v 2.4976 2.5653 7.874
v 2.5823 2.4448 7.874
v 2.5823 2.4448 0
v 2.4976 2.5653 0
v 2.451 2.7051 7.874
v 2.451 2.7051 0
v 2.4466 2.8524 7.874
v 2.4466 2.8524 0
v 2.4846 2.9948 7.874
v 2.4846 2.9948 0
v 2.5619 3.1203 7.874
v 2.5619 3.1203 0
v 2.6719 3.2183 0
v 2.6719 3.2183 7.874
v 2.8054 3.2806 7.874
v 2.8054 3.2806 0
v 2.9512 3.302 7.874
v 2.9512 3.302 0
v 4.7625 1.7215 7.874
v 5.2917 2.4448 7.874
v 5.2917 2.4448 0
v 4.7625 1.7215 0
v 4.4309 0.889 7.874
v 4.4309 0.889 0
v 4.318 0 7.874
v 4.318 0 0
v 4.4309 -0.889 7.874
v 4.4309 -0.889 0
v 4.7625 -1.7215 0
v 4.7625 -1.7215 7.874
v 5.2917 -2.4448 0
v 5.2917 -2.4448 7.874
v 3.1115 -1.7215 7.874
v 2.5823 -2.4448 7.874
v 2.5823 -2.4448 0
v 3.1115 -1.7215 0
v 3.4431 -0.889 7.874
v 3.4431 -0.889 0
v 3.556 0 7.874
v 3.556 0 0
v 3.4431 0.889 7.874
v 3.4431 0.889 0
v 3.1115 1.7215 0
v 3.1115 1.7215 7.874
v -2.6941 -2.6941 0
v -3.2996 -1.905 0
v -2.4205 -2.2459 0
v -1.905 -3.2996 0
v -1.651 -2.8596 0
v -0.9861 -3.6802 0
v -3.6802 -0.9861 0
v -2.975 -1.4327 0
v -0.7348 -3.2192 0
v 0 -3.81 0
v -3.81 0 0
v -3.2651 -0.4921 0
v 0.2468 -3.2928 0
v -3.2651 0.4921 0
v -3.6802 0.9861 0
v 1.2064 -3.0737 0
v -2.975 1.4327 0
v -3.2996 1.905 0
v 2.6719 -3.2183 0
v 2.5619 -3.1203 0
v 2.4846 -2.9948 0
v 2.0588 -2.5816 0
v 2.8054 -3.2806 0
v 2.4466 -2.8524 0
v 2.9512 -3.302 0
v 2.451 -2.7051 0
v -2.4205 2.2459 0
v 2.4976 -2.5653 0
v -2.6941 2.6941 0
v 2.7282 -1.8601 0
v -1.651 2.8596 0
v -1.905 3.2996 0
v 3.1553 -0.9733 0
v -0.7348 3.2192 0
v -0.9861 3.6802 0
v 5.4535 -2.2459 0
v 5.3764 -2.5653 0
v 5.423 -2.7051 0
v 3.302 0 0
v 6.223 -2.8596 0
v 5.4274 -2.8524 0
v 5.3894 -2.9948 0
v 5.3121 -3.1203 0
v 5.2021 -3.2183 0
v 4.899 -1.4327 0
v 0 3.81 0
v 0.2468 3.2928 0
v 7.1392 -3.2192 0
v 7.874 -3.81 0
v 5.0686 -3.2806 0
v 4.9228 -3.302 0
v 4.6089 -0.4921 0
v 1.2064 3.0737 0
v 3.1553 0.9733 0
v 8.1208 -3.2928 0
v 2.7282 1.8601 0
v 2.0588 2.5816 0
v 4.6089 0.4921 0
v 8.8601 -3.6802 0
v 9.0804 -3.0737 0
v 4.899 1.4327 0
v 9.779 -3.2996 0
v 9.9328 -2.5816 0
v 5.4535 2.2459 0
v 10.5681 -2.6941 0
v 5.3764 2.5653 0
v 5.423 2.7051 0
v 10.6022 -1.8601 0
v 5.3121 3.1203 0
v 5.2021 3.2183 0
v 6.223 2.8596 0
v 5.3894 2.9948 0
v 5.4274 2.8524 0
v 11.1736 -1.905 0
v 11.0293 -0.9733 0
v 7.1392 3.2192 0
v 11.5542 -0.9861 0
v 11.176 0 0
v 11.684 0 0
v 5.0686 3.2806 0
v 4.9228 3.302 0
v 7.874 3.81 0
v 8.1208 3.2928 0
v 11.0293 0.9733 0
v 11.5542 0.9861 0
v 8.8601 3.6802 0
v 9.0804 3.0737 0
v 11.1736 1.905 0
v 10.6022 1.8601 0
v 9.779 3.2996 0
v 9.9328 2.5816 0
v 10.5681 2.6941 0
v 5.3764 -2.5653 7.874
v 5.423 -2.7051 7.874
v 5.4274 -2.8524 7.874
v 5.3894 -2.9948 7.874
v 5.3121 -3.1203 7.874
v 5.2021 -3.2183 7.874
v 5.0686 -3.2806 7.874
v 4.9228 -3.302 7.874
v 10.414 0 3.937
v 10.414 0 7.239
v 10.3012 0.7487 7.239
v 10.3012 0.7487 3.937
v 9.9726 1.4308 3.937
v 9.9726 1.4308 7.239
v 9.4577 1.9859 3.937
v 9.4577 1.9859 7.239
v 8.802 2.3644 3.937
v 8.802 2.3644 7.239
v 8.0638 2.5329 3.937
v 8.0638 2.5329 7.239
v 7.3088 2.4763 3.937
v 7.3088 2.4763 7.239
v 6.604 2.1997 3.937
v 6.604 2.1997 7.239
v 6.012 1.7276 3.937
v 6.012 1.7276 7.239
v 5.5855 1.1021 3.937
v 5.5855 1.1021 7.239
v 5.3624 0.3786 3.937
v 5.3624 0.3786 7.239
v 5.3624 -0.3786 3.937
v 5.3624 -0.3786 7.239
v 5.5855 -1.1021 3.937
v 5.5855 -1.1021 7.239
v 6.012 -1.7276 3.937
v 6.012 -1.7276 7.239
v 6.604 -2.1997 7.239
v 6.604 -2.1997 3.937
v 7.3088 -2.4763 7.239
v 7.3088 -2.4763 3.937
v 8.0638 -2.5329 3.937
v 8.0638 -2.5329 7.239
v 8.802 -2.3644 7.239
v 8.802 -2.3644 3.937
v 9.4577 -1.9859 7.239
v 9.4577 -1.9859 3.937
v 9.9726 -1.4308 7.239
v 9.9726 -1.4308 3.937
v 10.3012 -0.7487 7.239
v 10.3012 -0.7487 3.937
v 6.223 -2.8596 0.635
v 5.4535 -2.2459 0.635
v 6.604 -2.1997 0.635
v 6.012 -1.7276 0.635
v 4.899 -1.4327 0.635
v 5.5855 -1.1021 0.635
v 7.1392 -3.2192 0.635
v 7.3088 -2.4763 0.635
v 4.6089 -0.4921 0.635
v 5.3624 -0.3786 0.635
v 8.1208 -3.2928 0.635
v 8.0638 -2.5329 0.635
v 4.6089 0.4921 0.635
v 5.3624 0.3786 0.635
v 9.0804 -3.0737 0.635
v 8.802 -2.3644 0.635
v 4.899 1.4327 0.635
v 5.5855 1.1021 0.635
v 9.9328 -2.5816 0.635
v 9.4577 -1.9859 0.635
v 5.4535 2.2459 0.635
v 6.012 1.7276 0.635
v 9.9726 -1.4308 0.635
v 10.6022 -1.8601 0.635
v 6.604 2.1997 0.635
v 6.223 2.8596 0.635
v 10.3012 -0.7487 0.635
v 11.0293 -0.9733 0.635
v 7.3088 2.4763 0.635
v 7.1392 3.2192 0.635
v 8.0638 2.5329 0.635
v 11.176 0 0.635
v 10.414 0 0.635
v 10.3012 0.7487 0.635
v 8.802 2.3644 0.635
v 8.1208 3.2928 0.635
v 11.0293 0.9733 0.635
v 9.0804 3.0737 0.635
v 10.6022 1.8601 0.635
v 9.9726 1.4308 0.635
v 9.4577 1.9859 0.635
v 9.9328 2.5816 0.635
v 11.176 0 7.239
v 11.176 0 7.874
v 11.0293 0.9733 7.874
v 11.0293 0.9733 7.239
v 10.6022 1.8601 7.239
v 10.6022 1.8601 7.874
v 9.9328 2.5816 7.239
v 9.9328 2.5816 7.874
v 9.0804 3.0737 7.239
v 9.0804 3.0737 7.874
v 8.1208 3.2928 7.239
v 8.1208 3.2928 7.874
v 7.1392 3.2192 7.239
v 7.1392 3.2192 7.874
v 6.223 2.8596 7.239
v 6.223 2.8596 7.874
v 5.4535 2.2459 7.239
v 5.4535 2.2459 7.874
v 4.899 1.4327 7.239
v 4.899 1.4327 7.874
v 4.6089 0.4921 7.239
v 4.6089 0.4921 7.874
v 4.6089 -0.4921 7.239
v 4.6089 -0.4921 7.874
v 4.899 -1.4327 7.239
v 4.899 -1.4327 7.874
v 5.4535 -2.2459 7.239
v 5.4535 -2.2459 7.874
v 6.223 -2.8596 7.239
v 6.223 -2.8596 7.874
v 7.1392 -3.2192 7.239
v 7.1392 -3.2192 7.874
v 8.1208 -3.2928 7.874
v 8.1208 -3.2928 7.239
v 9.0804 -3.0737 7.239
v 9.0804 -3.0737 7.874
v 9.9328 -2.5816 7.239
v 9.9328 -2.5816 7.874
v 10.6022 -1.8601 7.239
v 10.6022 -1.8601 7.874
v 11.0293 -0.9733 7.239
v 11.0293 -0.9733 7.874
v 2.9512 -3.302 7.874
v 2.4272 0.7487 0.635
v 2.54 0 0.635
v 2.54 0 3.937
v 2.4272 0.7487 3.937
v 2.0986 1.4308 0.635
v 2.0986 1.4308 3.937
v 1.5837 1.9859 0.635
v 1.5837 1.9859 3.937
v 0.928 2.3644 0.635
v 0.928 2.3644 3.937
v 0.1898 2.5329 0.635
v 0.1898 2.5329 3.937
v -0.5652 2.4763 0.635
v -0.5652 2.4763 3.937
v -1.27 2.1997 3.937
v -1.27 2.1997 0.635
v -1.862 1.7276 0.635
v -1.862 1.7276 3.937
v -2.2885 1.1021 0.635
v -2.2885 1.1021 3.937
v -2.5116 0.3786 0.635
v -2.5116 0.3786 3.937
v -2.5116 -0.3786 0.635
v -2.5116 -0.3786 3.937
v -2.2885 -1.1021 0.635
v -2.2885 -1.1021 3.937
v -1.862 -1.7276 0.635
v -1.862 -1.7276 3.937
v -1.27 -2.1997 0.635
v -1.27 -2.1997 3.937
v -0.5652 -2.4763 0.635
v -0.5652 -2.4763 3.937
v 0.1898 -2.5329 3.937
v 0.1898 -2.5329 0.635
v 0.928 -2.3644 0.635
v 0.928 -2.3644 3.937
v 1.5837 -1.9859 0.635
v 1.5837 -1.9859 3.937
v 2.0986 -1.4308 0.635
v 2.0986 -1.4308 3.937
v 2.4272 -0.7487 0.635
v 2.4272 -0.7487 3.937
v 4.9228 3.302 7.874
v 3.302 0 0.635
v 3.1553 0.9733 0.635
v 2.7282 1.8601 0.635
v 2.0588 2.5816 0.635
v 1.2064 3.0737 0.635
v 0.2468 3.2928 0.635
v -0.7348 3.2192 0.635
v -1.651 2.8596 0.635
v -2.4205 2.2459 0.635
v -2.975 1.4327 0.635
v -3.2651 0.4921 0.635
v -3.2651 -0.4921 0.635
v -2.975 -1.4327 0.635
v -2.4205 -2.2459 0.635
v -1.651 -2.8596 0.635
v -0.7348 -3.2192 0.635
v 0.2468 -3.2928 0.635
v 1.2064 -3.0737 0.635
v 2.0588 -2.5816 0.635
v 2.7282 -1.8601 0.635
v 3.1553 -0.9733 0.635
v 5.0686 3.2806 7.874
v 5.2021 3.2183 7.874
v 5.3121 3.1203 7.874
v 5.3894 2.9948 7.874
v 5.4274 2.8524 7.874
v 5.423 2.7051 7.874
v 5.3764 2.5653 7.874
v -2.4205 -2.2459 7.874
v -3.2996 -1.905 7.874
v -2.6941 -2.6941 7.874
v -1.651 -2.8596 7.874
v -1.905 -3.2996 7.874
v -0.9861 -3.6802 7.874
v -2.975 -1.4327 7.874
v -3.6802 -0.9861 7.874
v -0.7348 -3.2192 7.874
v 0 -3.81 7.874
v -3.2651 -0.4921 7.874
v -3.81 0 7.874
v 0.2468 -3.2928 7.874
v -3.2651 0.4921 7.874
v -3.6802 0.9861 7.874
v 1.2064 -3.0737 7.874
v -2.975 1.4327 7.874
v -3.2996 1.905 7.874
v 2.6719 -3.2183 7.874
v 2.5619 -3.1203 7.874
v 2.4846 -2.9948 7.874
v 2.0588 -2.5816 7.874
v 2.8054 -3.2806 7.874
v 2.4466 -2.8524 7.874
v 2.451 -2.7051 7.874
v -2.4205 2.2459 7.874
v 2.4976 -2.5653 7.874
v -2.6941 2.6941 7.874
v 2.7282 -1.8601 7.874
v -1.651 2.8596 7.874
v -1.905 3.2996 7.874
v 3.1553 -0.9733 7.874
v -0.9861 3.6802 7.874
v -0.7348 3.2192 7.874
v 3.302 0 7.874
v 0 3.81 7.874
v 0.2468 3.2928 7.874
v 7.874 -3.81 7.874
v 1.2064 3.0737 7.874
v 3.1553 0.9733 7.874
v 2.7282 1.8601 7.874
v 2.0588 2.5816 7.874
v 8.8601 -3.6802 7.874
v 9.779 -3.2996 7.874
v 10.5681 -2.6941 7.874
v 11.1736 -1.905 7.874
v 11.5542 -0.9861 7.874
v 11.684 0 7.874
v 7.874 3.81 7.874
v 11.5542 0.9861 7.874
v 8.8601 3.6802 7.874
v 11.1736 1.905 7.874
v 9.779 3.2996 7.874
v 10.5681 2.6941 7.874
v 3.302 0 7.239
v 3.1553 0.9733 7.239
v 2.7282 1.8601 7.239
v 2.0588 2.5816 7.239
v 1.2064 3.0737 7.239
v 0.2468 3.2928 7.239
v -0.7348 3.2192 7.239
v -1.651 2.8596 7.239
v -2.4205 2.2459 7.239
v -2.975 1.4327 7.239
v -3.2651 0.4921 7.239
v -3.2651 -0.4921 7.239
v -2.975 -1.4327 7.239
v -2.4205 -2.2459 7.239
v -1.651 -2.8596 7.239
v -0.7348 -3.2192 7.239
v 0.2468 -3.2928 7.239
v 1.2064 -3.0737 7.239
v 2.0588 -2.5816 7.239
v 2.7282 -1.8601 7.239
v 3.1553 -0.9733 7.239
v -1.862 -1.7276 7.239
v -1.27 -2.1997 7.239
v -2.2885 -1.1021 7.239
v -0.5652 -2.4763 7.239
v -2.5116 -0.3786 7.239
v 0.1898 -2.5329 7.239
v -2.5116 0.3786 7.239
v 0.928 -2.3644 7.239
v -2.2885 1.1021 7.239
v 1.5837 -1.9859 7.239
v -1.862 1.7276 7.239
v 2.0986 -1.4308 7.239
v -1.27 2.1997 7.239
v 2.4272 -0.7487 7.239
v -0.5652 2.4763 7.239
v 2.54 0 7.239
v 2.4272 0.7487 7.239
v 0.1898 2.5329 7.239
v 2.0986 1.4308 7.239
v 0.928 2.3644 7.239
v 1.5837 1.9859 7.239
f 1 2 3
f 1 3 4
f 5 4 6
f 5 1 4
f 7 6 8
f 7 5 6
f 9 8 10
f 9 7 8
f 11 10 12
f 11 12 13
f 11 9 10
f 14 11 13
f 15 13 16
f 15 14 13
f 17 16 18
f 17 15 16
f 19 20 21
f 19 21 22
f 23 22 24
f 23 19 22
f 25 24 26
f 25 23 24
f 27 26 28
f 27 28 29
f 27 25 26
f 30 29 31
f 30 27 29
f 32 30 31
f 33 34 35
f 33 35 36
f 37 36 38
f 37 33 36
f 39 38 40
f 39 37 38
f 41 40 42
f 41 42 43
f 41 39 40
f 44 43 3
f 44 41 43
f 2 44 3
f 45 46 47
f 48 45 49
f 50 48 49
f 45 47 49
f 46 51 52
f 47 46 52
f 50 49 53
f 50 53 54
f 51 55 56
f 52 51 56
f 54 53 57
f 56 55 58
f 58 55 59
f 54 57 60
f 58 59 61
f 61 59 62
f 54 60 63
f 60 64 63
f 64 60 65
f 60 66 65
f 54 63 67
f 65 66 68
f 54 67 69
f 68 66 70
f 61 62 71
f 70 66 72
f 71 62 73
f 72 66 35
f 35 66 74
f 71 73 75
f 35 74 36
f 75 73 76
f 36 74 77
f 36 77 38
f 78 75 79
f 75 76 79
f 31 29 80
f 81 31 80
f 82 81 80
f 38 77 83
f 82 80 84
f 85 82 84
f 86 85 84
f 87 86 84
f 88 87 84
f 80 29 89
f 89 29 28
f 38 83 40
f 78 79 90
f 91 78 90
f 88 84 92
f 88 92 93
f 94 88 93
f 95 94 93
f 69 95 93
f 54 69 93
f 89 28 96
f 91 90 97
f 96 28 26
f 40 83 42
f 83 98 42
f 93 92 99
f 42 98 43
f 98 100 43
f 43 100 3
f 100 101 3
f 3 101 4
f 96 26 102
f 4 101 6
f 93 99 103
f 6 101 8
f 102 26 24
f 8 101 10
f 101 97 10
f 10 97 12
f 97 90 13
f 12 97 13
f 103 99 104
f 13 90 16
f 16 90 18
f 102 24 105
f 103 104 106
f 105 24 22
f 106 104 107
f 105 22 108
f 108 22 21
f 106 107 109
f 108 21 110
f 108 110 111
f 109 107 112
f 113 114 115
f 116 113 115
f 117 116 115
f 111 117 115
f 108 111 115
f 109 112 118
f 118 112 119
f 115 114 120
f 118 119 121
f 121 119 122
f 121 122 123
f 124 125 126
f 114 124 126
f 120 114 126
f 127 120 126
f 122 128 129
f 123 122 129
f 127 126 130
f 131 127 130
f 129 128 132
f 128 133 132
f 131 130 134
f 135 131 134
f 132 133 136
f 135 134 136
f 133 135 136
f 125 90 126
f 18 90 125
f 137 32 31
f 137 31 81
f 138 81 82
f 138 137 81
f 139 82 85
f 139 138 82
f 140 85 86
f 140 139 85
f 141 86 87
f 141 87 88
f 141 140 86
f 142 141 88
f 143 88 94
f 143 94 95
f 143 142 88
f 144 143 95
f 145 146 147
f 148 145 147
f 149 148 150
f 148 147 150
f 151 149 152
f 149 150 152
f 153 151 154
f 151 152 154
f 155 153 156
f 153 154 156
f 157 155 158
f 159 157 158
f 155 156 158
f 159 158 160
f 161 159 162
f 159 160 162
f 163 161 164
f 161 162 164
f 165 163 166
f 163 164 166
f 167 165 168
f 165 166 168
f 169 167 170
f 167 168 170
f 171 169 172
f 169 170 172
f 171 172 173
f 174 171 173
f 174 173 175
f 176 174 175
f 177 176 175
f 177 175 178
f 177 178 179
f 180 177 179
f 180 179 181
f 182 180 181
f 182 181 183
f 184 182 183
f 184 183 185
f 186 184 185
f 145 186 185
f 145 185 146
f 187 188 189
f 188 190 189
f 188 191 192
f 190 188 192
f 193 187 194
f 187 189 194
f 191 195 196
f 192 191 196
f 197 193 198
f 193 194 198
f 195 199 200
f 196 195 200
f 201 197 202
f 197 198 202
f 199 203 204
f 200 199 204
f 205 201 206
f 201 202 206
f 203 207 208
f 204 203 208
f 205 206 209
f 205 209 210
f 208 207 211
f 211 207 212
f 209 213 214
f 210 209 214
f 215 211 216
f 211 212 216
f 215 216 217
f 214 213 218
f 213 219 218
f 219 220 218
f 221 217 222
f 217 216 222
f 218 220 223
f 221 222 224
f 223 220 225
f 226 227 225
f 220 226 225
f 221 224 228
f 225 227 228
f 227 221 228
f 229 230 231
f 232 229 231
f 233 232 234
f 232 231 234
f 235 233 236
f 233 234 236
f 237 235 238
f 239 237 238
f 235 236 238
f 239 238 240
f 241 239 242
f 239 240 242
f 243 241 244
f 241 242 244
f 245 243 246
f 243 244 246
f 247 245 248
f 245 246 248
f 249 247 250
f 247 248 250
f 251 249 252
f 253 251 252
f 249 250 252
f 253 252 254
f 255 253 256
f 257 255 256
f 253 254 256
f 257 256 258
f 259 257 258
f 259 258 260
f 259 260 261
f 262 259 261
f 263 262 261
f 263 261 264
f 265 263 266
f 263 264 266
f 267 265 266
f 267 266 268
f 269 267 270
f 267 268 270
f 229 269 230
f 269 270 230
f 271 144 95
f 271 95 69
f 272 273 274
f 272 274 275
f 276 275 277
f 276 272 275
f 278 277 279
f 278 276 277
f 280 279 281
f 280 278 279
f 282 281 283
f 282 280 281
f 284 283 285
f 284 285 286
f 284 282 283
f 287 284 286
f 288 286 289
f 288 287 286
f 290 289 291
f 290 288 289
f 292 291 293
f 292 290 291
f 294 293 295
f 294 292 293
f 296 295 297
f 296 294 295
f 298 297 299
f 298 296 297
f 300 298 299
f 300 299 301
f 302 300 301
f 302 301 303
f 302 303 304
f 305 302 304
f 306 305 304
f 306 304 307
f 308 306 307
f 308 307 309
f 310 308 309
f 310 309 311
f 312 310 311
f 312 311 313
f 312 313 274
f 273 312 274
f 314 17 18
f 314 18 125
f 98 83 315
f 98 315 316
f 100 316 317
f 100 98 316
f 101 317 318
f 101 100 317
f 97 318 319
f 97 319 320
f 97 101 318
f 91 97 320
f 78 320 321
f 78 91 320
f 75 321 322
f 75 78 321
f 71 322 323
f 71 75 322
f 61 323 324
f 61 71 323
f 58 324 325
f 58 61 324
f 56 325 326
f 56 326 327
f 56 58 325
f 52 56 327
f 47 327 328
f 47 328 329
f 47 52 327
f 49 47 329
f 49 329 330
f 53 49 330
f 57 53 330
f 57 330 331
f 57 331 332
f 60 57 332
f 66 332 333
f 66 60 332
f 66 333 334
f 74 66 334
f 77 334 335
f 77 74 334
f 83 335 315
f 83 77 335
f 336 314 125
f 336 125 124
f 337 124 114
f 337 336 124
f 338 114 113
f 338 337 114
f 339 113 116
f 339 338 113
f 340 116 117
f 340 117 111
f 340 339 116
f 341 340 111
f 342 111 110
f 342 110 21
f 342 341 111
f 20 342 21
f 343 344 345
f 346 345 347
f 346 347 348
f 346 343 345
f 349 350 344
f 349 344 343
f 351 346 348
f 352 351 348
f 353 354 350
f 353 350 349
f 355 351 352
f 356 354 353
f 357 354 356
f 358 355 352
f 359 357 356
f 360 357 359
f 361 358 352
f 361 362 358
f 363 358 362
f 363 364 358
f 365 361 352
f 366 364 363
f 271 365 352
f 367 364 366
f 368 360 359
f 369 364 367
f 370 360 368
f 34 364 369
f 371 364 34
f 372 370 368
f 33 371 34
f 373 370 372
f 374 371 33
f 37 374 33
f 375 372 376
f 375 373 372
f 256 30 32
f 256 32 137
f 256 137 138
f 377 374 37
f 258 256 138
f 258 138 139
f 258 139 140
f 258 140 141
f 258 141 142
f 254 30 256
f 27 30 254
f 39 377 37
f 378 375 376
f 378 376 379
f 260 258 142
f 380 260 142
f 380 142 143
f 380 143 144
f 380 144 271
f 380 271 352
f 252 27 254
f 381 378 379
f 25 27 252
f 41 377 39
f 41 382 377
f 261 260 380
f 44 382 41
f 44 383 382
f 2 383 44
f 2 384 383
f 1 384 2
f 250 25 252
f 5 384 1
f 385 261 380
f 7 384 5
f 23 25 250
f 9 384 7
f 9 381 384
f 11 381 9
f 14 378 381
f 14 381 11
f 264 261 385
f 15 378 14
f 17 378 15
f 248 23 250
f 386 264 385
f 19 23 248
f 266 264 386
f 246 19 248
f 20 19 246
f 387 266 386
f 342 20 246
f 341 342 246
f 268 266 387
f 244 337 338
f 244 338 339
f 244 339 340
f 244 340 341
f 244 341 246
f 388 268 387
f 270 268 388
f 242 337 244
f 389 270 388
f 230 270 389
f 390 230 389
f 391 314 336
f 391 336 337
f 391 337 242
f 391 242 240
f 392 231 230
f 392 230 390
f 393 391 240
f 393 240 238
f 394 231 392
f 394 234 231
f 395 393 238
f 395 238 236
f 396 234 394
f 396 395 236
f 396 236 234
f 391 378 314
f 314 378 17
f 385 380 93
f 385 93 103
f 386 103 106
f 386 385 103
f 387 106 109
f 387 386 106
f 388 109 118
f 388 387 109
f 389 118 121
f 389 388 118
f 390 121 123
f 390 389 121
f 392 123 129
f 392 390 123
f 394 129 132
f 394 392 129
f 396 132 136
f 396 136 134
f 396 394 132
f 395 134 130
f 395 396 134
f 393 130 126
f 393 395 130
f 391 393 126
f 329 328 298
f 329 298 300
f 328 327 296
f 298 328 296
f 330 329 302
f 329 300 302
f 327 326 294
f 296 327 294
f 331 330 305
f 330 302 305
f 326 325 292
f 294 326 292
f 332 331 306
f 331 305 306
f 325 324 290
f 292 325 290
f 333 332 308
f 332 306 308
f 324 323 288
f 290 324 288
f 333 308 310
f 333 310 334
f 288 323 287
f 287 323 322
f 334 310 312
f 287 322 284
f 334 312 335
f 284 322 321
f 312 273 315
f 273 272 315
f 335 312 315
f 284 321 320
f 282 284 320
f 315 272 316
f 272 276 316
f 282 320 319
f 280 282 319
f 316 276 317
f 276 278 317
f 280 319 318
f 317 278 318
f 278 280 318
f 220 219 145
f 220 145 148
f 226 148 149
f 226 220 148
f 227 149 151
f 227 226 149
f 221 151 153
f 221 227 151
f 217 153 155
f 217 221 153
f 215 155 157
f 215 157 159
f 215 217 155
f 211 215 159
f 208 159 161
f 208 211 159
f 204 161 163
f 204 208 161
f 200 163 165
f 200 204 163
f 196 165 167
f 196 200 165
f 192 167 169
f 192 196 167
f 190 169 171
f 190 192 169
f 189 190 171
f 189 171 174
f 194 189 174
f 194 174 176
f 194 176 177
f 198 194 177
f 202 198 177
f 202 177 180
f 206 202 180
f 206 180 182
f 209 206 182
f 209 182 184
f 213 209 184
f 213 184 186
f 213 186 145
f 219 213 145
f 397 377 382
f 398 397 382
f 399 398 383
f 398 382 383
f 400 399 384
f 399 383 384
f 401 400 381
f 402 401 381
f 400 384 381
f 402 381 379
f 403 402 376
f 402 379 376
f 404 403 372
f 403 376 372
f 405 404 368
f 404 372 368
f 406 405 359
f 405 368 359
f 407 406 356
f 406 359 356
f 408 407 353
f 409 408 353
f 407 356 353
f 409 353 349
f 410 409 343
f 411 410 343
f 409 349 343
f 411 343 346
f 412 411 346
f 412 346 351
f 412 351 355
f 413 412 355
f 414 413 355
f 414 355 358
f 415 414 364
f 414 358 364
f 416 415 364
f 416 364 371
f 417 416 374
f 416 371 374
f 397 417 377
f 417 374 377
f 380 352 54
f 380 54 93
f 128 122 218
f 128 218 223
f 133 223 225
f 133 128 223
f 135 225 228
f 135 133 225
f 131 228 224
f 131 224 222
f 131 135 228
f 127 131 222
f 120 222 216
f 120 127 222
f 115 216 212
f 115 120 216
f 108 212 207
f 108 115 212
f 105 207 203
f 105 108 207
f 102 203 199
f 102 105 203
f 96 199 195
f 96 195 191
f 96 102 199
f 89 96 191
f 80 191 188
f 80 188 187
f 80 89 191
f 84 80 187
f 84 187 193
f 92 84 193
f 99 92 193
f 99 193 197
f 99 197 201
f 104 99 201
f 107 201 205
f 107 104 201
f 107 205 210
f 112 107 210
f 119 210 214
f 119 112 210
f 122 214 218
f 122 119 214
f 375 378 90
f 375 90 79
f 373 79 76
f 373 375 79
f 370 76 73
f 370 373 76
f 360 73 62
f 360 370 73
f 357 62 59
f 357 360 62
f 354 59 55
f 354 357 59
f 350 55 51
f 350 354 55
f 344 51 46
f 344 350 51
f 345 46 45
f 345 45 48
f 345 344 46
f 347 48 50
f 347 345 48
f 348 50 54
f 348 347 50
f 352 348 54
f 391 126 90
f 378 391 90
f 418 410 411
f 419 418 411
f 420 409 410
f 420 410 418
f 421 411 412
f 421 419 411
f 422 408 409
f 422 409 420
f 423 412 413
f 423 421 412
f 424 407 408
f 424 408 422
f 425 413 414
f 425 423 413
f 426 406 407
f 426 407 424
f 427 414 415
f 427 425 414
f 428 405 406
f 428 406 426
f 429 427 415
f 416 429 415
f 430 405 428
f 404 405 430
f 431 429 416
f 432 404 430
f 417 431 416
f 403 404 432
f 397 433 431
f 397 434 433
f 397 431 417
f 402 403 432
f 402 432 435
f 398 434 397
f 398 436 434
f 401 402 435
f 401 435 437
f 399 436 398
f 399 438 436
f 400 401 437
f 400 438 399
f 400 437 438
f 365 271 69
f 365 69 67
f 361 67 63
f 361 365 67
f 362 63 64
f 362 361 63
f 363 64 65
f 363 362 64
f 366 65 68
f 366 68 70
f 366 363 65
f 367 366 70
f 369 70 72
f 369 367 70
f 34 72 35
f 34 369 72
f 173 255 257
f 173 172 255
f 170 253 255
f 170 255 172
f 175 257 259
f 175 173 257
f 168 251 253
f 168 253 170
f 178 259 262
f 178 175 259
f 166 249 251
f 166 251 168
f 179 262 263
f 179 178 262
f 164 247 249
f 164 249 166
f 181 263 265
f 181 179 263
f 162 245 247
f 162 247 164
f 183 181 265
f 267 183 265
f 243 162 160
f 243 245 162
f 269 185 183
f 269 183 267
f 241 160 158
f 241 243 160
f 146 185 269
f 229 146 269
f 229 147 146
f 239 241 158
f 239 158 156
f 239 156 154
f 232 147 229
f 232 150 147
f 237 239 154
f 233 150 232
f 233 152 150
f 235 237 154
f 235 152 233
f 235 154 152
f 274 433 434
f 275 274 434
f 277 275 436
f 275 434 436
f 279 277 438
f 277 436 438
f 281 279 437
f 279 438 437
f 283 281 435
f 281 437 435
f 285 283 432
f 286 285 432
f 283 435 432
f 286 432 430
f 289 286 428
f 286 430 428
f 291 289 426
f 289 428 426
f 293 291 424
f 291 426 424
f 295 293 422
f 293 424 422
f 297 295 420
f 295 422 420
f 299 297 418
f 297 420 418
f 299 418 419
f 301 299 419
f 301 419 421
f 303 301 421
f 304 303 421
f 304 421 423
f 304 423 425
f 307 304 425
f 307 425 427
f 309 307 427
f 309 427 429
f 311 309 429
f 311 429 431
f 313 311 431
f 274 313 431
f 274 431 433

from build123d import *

# Parameters (mm, degrees)
SKETCH1_R                   = 3.302
SKETCH1_R_2                 = 2.54
BOSS_EXTRUDE1_DEPTH         = 3.937
BODY_MOVE_COPY1_OUTLINE_R   = 2.54
BODY_MOVE_COPY1_DEPTH       = 3.937
BODY_MOVE_COPY1_2_OUTLINE_R = 2.54
BODY_MOVE_COPY1_2_DEPTH     = 3.937
SKETCH2_R                   = 3.302
CUT_EXTRUDE1_DEPTH          = 0.635


# Read off the part's stored shape, not the designer's step: Body-Move/Copy1
with BuildPart() as part:
    # Sketch1 → Boss-Extrude1 (new body)
    # profile 1 of 4: a face of its own
    with BuildSketch(Plane.XY):
        with BuildLine():
            Line((3.937, -3.81), (7.874, -3.81))
            ThreePointArc((7.874, -3.81), (11.684, 0), (7.874, 3.81))
            Line((7.874, 3.81), (3.937, 3.81))
            Line((3.937, 3.81), (3.937, 3.302))
            Line((3.937, 3.302), (4.92278669, 3.302))
            ThreePointArc((4.92278669, 3.302), (5.389414486, 2.994804631), (5.291688354, 2.44475))
            ThreePointArc((5.291688354, 2.44475), (4.318, 0), (5.291688354, -2.44475))
            ThreePointArc((5.291688354, -2.44475), (5.389414486, -2.994804631), (4.92278669, -3.302))
            Line((4.92278669, -3.302), (3.937, -3.302))
            Line((3.937, -3.302), (3.937, -3.81))
        make_face()
        with Locations((7.874, 0)):
            Circle(SKETCH1_R, mode=Mode.SUBTRACT)
    # profile 2 of 4: a face of its own
    with BuildSketch(Plane.XY):
        with Locations((7.874, 0)):
            Circle(SKETCH1_R)
        with Locations((7.874, 0)):
            Circle(SKETCH1_R_2, mode=Mode.SUBTRACT)
    # profile 3 of 4: a face of its own
    with BuildSketch(Plane.XY):
        with BuildLine():
            Line((-7.874, -3.81), (-3.937, -3.81))
            Line((-3.937, -3.81), (-3.937, -3.302))
            Line((-3.937, -3.302), (-4.92278669, -3.302))
            ThreePointArc((-4.92278669, -3.302), (-5.389414486, -2.994804631), (-5.291688354, -2.44475))
            ThreePointArc((-5.291688354, -2.44475), (-4.318, 0), (-5.291688354, 2.44475))
            ThreePointArc((-5.291688354, 2.44475), (-5.389414486, 2.994804631), (-4.92278669, 3.302))
            Line((-4.92278669, 3.302), (-3.937, 3.302))
            Line((-3.937, 3.302), (-3.937, 3.81))
            Line((-3.937, 3.81), (-7.874, 3.81))
            ThreePointArc((-7.874, 3.81), (-11.684, 0), (-7.874, -3.81))
        make_face()
        with Locations((-7.874, 0)):
            Circle(SKETCH1_R, mode=Mode.SUBTRACT)
    # profile 4 of 4: a face of its own
    with BuildSketch(Plane.XY):
        with Locations((-7.874, 0)):
            Circle(SKETCH1_R)
        with Locations((-7.874, 0)):
            Circle(SKETCH1_R_2, mode=Mode.SUBTRACT)
    extrude(amount=BOSS_EXTRUDE1_DEPTH)

    # Body-Move/Copy1 outline → Body-Move/Copy1 (cut)
    with BuildSketch(Plane.XY):
        with BuildLine():
            ThreePointArc((-7.874, 3.81), (-11.684, 0), (-7.874, -3.81))
            Line((-7.874, -3.81), (-3.937, -3.81))
            Line((-3.937, -3.81), (-3.937, -3.302))
            Line((-3.937, -3.302), (-4.92278669, -3.302))
            ThreePointArc((-4.92278669, -3.302), (-5.389414486, -2.994804631), (-5.291688354, -2.44475))
            ThreePointArc((-5.291688354, -2.44475), (-4.318, 0), (-5.291688354, 2.44475))
            ThreePointArc((-5.291688354, 2.44475), (-5.389414486, 2.994804631), (-4.92278669, 3.302))
            Line((-4.92278669, 3.302), (-3.937, 3.302))
            Line((-3.937, 3.302), (-3.937, 3.81))
            Line((-3.937, 3.81), (-7.874, 3.81))
        make_face()
        with Locations((-7.874, 0)):
            Circle(BODY_MOVE_COPY1_OUTLINE_R, mode=Mode.SUBTRACT)
    extrude(amount=BODY_MOVE_COPY1_DEPTH, mode=Mode.SUBTRACT)


with BuildPart() as body_2:
    # Body-Move_Copy1 2 outline → Body-Move_Copy1 2 (new body)
    with BuildSketch(Plane.XY):
        with BuildLine():
            ThreePointArc((0, 3.81), (-3.81, 0), (0, -3.81))
            Line((0, -3.81), (3.937, -3.81))
            Line((3.937, -3.81), (3.937, -3.302))
            Line((3.937, -3.302), (2.95121331, -3.302))
            ThreePointArc((2.95121331, -3.302), (2.484585514, -2.994804631), (2.582311646, -2.44475))
            ThreePointArc((2.582311646, -2.44475), (3.556, 0), (2.582311646, 2.44475))
            ThreePointArc((2.582311646, 2.44475), (2.484585514, 2.994804631), (2.95121331, 3.302))
            Line((2.95121331, 3.302), (3.937, 3.302))
            Line((3.937, 3.302), (3.937, 3.81))
            Line((3.937, 3.81), (0, 3.81))
        make_face()
        Circle(BODY_MOVE_COPY1_2_OUTLINE_R, mode=Mode.SUBTRACT)
    extrude(amount=BODY_MOVE_COPY1_2_DEPTH)


with BuildPart() as cut_extrude1_tool:
    # Sketch2 → Cut-Extrude1 (new body)
    with BuildSketch(Plane.XY):
        with Locations((7.874, 0)):
            Circle(SKETCH2_R)
        Circle(SKETCH2_R)
    extrude(amount=CUT_EXTRUDE1_DEPTH)


with BuildPart() as part_1:
    add(part.part)

    # Cut-Extrude1: cut by cut_extrude1_tool
    add(cut_extrude1_tool.part, mode=Mode.SUBTRACT)


with BuildPart() as body_2_1:
    add(body_2.part)

    # Cut-Extrude1: cut by cut_extrude1_tool
    add(cut_extrude1_tool.part, mode=Mode.SUBTRACT)


with BuildPart() as part_2:
    add(part_1.part)

    # Combine1: union body 2
    add(body_2_1.part)

    # Mirror3: part across plane


with BuildPart() as part_3:
    add(part_2.part)
    add(part_2.part.mirror(Plane.XY.offset(3.937)))


solid = part_3.part
